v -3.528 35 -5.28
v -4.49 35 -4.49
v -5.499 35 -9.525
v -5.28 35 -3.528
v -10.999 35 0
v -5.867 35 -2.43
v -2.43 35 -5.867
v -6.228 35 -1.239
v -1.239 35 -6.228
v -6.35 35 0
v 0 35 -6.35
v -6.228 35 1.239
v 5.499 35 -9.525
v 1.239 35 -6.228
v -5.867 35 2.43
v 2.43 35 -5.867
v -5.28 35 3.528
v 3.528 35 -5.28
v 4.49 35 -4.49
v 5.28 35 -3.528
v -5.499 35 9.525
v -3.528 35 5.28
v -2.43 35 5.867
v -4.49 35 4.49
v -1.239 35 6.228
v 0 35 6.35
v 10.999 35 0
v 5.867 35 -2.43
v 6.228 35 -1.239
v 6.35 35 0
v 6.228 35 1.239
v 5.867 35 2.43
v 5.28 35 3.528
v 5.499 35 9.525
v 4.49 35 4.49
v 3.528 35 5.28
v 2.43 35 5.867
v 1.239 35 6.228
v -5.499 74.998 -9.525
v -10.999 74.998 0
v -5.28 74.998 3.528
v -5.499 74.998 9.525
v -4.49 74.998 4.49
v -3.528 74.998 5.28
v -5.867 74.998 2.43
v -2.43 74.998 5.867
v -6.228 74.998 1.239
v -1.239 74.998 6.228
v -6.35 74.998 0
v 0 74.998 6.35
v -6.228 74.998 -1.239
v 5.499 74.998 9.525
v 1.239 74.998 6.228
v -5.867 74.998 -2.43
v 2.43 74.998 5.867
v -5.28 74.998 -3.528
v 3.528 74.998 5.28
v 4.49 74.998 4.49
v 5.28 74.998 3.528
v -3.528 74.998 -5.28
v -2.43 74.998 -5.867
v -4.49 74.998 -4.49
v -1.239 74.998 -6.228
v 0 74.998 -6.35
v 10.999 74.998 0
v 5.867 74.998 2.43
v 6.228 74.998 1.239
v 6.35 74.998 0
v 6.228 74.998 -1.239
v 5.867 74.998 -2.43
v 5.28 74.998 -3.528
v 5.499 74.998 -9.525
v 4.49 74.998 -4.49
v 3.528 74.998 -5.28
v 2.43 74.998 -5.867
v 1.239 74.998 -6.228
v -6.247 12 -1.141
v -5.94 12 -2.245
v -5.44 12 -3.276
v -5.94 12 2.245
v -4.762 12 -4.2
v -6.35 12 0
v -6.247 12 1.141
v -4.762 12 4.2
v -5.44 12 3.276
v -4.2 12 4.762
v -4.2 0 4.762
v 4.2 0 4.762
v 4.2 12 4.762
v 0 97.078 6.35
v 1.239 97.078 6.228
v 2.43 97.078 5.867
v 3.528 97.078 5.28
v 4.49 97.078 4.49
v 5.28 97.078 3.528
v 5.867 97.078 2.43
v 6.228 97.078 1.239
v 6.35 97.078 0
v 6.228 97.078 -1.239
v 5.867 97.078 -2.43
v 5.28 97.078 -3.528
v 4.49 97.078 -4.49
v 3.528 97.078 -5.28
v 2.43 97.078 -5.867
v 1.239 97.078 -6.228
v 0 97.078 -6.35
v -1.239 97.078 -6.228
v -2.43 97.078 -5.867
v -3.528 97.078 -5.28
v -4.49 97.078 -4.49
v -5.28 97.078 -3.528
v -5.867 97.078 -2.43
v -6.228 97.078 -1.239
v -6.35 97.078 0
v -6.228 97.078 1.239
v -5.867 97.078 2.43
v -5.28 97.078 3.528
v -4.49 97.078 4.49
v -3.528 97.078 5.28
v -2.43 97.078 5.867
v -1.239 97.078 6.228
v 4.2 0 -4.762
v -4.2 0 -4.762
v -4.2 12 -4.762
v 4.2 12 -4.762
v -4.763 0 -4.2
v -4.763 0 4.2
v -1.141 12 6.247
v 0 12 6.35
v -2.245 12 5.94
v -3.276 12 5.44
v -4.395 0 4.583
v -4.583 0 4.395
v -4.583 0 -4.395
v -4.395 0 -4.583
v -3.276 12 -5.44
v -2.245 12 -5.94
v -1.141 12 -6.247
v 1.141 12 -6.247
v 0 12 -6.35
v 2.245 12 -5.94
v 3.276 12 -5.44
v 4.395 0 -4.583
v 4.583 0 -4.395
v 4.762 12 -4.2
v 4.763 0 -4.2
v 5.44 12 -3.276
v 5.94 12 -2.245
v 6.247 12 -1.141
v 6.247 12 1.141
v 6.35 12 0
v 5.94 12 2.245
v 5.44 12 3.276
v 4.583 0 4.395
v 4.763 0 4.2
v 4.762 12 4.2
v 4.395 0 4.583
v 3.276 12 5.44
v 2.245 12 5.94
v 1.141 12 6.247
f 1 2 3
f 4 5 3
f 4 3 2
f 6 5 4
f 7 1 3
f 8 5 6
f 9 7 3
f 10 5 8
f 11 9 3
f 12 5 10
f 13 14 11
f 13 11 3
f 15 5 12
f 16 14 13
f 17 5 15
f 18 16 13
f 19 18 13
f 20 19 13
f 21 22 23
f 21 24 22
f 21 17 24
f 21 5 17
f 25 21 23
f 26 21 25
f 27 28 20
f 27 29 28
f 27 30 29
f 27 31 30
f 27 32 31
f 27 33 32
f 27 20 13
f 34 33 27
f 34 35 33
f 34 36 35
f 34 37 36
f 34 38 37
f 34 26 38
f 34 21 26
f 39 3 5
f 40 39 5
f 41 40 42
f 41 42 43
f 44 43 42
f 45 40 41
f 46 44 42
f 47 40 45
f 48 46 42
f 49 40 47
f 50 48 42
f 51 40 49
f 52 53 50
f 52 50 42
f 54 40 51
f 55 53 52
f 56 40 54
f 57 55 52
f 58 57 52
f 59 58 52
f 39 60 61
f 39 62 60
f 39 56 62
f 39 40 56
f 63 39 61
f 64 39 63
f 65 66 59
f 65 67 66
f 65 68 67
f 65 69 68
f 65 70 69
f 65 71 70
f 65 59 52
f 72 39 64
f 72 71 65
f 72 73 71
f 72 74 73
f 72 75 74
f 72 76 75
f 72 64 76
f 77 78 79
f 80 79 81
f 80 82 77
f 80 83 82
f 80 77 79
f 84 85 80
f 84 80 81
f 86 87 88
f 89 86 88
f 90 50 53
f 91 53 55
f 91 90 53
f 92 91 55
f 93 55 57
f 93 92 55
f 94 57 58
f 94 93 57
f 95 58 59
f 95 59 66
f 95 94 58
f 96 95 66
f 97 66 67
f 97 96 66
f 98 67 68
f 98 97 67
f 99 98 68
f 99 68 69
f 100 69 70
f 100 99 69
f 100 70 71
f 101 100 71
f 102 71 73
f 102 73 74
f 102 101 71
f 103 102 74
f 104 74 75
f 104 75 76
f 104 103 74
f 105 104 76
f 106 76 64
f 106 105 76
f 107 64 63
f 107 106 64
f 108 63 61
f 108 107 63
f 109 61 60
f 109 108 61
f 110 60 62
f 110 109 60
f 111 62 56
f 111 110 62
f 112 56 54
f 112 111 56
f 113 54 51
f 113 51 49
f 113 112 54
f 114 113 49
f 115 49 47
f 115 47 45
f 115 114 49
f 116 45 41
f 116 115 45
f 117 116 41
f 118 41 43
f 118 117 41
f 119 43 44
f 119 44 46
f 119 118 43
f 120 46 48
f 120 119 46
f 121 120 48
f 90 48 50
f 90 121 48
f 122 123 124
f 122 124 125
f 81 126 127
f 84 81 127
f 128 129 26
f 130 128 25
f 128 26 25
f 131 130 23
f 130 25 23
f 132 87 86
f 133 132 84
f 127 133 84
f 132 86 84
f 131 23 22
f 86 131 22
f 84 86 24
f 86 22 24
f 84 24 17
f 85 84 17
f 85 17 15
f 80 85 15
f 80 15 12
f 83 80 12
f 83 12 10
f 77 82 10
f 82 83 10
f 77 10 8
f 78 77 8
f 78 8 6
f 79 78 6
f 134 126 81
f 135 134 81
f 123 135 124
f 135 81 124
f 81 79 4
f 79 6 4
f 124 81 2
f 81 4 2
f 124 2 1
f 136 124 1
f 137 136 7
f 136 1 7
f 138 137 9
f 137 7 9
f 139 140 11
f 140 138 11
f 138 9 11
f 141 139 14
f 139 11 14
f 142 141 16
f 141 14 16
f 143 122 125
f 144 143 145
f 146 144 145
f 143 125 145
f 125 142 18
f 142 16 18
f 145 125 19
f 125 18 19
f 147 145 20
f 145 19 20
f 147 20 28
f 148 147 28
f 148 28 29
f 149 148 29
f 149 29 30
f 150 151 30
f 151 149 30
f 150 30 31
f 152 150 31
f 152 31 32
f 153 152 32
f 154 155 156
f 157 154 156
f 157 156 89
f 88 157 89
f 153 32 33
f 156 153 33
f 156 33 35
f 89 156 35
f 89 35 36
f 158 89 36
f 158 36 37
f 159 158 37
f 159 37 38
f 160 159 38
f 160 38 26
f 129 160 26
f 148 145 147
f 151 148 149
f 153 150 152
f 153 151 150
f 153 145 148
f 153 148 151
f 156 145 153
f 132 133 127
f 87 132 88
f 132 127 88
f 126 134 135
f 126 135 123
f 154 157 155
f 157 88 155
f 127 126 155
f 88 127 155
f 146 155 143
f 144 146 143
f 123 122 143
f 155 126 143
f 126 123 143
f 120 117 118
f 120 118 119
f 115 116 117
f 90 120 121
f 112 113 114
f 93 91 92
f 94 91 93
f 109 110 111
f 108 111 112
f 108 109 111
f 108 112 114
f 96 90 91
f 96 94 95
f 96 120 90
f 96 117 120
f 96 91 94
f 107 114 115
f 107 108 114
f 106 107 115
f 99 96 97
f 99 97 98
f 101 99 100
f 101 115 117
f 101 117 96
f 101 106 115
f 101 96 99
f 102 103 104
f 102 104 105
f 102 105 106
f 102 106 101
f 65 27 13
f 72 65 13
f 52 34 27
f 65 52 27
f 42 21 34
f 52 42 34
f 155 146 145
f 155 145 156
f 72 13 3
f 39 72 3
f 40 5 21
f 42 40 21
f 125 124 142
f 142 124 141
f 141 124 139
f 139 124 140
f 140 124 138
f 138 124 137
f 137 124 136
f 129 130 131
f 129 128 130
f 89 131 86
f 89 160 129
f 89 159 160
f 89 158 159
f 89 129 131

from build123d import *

# Parameters (mm, degrees)
BOSS_EXTRUDE1_DEPTH = 97.0775
SKETCH2_R           = 6.35
CUT_EXTRUDE1_DEPTH  = 22.08
CUT_EXTRUDE2_START  = -35
SKETCH3_R           = 6.35
CUT_EXTRUDE2_DEPTH  = 35
SKETCH4_W           = 9.525
SKETCH4_H           = 9.525
CUT_EXTRUDE3_DEPTH  = 12


with BuildPart() as part:
    # Sketch1 → Boss-Extrude1 (new body)
    with BuildSketch(Plane(origin=(0, 0, 0), x_dir=(1, 0, 0), z_dir=(0, 1, 0))):
        Polygon((5.499261314, 9.525), (-5.499261314, 9.525), (-10.998522628, 0), (-5.499261314, -9.525), (5.499261314, -9.525), (10.998522628, 0), align=None)
    extrude(amount=BOSS_EXTRUDE1_DEPTH)

    # Sketch2 → Cut-Extrude1 (cut)
    with BuildSketch(Plane(origin=(0, 97.0775, 0), x_dir=(1, 0, 0), z_dir=(0, 1, 0))):
        Polygon((10.998522628, 0), (5.499261314, 9.525), (-5.499261314, 9.525), (-10.998522628, 0), (-5.499261314, -9.525), (5.499261314, -9.525), align=None)
        with Locations(Location((0, 0, 0), (0, 0, 270))):
            Circle(SKETCH2_R, mode=Mode.SUBTRACT)
    extrude(amount=-CUT_EXTRUDE1_DEPTH, mode=Mode.SUBTRACT)

    # Sketch3 → Cut-Extrude2 (cut)
    with BuildSketch(Plane.XZ.offset(CUT_EXTRUDE2_START)):
        Polygon((5.499261314, -9.525), (10.998522628, 0), (5.499261314, 9.525), (-5.499261314, 9.525), (-10.998522628, 0), (-5.499261314, -9.525), align=None)
        with Locations(Location((0, 0, 0), (0, 0, 90))):
            Circle(SKETCH3_R, mode=Mode.SUBTRACT)
    extrude(amount=CUT_EXTRUDE2_DEPTH, mode=Mode.SUBTRACT)

    # Sketch4 → Cut-Extrude3 (cut)
    with BuildSketch(Plane.XZ):
        Polygon((-5.499261314, -9.525), (5.499261314, -9.525), (10.998522628, 0), (5.499261314, 9.525), (-5.499261314, 9.525), (-10.998522628, 0), align=None)
        Rectangle(SKETCH4_W, SKETCH4_H, mode=Mode.SUBTRACT)
    extrude(amount=-CUT_EXTRUDE3_DEPTH, mode=Mode.SUBTRACT)


solid = part.part
